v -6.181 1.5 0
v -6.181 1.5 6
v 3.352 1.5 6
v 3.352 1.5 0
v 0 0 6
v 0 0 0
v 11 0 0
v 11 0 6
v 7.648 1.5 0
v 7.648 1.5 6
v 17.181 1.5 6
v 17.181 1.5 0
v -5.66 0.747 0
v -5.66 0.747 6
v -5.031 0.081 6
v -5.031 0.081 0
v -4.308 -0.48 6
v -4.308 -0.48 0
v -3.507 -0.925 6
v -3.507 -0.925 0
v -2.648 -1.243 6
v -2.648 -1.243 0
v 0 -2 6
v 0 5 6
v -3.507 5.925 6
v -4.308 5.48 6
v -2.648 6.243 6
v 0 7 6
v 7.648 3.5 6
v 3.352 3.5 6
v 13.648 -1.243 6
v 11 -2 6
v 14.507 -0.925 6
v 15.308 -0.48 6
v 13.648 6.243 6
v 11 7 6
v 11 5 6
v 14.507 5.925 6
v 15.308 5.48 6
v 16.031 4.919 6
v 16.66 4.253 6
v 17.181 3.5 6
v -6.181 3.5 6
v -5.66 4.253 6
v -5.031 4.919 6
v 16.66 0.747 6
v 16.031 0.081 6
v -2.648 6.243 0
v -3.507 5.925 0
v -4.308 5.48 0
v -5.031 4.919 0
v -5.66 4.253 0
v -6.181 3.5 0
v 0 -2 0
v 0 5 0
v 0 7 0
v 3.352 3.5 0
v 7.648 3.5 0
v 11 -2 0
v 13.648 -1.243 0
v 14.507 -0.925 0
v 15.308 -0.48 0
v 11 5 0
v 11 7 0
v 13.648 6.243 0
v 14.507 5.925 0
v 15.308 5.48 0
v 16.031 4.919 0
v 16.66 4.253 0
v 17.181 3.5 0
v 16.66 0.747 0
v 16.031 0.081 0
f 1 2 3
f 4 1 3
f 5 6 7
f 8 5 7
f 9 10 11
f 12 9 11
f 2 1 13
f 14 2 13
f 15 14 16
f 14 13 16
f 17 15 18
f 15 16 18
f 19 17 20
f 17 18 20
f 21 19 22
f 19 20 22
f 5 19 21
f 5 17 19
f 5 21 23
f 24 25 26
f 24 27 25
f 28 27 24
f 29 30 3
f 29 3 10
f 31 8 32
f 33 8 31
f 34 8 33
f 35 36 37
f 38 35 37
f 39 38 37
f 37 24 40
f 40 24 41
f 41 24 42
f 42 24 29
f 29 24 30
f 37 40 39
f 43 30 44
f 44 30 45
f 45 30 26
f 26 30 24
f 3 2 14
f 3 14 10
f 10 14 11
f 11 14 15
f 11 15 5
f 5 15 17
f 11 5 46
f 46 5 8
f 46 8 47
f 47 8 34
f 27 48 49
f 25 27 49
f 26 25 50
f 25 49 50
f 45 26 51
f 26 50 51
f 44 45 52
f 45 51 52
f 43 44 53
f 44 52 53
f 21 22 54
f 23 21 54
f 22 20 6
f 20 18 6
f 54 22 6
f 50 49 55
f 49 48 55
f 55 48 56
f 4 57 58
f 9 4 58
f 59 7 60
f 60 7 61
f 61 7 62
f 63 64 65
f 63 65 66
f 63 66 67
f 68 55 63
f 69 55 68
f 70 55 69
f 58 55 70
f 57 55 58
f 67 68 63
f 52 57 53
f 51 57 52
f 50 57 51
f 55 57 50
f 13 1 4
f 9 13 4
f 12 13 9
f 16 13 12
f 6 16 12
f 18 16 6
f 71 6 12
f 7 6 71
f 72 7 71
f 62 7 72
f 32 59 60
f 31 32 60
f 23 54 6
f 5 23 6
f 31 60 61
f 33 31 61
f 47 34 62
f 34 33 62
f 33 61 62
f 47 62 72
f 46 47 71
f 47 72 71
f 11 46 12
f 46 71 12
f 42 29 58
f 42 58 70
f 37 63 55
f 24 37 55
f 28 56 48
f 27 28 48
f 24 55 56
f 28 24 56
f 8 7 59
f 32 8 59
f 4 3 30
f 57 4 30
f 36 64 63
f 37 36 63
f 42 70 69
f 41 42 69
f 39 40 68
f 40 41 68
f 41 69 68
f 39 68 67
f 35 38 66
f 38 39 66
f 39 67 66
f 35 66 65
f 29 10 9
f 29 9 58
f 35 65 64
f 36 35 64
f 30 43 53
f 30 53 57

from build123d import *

# Parameters (mm, degrees)
F1_DEPTH    = 6
F2_T1_DEPTH = 28.6290423826
F3_W        = 12.6199351555
F3_H        = 2
F3_W_2      = 15.3329153147
F4_DEPTH    = 6


# Not quite as in the source:
# - a fillet or chamfer that OpenCascade refuses, or shapes differently, is made with other operations: its cross-section is extruded or revolved along the edge and cut away or added


with BuildPart() as f1:
    # F0 (on Top) → F1 (new body)
    with BuildSketch(Plane.XY):
        Polygon((0, 7), (-7, 5), (0, 5), align=None)
        Polygon((0, 5), (-7, 5), (-7, 0), (0, 0), (11, 0), (18, 0), (18, 5), (11, 5), align=None)
        Polygon((0, 0), (-7, 0), (0, -2), align=None)
        Polygon((11, 7), (11, 5), (18, 5), align=None)
        Polygon((18, 0), (11, 0), (11, -2), align=None)
    extrude(amount=F1_DEPTH)

    # F2: fillet of radius 6 on 4 edges, made by hand

    # F2_s2 → F2_t1 (cut)
    with BuildSketch(Plane.XY.offset(-11.3145211913)):
        with BuildLine():
            ThreePointArc((-2.6483267674, 6.2433352093), (-5.7900918887, 4.0873646023), (-7, 0.4741915235))
            Line((-7, 0.4741915235), (-7, 5))
            Line((-7, 5), (-2.6483267674, 6.2433352093))
        make_face()
        with BuildLine():
            ThreePointArc((-7, 4.5258084765), (-5.7900918887, 0.9126353977), (-2.6483267674, -1.2433352093))
            Line((-2.6483267674, -1.2433352093), (-7, 0))
            Line((-7, 0), (-7, 4.5258084765))
        make_face()
        with BuildLine():
            ThreePointArc((18, 0.4741915235), (16.7900918887, 4.0873646023), (13.6483267674, 6.2433352093))
            Line((13.6483267674, 6.2433352093), (18, 5))
            Line((18, 5), (18, 0.4741915235))
        make_face()
        with BuildLine():
            ThreePointArc((13.6483267674, -1.2433352093), (16.7900918887, 0.9126353977), (18, 4.5258084765))
            Line((18, 4.5258084765), (18, 0))
            Line((18, 0), (13.6483267674, -1.2433352093))
        make_face()
    extrude(amount=F2_T1_DEPTH, mode=Mode.SUBTRACT)

    # F3 (on face) → F4 (cut)
    with BuildSketch(Plane.XY.offset(6)):
        with Locations((-2.9576308128, 2.5)):
            Rectangle(F3_W, F3_H)
        with Locations((15.3141208924, 2.5)):
            Rectangle(F3_W_2, F3_H)
    extrude(amount=-F4_DEPTH, mode=Mode.SUBTRACT)


solid = f1.part
